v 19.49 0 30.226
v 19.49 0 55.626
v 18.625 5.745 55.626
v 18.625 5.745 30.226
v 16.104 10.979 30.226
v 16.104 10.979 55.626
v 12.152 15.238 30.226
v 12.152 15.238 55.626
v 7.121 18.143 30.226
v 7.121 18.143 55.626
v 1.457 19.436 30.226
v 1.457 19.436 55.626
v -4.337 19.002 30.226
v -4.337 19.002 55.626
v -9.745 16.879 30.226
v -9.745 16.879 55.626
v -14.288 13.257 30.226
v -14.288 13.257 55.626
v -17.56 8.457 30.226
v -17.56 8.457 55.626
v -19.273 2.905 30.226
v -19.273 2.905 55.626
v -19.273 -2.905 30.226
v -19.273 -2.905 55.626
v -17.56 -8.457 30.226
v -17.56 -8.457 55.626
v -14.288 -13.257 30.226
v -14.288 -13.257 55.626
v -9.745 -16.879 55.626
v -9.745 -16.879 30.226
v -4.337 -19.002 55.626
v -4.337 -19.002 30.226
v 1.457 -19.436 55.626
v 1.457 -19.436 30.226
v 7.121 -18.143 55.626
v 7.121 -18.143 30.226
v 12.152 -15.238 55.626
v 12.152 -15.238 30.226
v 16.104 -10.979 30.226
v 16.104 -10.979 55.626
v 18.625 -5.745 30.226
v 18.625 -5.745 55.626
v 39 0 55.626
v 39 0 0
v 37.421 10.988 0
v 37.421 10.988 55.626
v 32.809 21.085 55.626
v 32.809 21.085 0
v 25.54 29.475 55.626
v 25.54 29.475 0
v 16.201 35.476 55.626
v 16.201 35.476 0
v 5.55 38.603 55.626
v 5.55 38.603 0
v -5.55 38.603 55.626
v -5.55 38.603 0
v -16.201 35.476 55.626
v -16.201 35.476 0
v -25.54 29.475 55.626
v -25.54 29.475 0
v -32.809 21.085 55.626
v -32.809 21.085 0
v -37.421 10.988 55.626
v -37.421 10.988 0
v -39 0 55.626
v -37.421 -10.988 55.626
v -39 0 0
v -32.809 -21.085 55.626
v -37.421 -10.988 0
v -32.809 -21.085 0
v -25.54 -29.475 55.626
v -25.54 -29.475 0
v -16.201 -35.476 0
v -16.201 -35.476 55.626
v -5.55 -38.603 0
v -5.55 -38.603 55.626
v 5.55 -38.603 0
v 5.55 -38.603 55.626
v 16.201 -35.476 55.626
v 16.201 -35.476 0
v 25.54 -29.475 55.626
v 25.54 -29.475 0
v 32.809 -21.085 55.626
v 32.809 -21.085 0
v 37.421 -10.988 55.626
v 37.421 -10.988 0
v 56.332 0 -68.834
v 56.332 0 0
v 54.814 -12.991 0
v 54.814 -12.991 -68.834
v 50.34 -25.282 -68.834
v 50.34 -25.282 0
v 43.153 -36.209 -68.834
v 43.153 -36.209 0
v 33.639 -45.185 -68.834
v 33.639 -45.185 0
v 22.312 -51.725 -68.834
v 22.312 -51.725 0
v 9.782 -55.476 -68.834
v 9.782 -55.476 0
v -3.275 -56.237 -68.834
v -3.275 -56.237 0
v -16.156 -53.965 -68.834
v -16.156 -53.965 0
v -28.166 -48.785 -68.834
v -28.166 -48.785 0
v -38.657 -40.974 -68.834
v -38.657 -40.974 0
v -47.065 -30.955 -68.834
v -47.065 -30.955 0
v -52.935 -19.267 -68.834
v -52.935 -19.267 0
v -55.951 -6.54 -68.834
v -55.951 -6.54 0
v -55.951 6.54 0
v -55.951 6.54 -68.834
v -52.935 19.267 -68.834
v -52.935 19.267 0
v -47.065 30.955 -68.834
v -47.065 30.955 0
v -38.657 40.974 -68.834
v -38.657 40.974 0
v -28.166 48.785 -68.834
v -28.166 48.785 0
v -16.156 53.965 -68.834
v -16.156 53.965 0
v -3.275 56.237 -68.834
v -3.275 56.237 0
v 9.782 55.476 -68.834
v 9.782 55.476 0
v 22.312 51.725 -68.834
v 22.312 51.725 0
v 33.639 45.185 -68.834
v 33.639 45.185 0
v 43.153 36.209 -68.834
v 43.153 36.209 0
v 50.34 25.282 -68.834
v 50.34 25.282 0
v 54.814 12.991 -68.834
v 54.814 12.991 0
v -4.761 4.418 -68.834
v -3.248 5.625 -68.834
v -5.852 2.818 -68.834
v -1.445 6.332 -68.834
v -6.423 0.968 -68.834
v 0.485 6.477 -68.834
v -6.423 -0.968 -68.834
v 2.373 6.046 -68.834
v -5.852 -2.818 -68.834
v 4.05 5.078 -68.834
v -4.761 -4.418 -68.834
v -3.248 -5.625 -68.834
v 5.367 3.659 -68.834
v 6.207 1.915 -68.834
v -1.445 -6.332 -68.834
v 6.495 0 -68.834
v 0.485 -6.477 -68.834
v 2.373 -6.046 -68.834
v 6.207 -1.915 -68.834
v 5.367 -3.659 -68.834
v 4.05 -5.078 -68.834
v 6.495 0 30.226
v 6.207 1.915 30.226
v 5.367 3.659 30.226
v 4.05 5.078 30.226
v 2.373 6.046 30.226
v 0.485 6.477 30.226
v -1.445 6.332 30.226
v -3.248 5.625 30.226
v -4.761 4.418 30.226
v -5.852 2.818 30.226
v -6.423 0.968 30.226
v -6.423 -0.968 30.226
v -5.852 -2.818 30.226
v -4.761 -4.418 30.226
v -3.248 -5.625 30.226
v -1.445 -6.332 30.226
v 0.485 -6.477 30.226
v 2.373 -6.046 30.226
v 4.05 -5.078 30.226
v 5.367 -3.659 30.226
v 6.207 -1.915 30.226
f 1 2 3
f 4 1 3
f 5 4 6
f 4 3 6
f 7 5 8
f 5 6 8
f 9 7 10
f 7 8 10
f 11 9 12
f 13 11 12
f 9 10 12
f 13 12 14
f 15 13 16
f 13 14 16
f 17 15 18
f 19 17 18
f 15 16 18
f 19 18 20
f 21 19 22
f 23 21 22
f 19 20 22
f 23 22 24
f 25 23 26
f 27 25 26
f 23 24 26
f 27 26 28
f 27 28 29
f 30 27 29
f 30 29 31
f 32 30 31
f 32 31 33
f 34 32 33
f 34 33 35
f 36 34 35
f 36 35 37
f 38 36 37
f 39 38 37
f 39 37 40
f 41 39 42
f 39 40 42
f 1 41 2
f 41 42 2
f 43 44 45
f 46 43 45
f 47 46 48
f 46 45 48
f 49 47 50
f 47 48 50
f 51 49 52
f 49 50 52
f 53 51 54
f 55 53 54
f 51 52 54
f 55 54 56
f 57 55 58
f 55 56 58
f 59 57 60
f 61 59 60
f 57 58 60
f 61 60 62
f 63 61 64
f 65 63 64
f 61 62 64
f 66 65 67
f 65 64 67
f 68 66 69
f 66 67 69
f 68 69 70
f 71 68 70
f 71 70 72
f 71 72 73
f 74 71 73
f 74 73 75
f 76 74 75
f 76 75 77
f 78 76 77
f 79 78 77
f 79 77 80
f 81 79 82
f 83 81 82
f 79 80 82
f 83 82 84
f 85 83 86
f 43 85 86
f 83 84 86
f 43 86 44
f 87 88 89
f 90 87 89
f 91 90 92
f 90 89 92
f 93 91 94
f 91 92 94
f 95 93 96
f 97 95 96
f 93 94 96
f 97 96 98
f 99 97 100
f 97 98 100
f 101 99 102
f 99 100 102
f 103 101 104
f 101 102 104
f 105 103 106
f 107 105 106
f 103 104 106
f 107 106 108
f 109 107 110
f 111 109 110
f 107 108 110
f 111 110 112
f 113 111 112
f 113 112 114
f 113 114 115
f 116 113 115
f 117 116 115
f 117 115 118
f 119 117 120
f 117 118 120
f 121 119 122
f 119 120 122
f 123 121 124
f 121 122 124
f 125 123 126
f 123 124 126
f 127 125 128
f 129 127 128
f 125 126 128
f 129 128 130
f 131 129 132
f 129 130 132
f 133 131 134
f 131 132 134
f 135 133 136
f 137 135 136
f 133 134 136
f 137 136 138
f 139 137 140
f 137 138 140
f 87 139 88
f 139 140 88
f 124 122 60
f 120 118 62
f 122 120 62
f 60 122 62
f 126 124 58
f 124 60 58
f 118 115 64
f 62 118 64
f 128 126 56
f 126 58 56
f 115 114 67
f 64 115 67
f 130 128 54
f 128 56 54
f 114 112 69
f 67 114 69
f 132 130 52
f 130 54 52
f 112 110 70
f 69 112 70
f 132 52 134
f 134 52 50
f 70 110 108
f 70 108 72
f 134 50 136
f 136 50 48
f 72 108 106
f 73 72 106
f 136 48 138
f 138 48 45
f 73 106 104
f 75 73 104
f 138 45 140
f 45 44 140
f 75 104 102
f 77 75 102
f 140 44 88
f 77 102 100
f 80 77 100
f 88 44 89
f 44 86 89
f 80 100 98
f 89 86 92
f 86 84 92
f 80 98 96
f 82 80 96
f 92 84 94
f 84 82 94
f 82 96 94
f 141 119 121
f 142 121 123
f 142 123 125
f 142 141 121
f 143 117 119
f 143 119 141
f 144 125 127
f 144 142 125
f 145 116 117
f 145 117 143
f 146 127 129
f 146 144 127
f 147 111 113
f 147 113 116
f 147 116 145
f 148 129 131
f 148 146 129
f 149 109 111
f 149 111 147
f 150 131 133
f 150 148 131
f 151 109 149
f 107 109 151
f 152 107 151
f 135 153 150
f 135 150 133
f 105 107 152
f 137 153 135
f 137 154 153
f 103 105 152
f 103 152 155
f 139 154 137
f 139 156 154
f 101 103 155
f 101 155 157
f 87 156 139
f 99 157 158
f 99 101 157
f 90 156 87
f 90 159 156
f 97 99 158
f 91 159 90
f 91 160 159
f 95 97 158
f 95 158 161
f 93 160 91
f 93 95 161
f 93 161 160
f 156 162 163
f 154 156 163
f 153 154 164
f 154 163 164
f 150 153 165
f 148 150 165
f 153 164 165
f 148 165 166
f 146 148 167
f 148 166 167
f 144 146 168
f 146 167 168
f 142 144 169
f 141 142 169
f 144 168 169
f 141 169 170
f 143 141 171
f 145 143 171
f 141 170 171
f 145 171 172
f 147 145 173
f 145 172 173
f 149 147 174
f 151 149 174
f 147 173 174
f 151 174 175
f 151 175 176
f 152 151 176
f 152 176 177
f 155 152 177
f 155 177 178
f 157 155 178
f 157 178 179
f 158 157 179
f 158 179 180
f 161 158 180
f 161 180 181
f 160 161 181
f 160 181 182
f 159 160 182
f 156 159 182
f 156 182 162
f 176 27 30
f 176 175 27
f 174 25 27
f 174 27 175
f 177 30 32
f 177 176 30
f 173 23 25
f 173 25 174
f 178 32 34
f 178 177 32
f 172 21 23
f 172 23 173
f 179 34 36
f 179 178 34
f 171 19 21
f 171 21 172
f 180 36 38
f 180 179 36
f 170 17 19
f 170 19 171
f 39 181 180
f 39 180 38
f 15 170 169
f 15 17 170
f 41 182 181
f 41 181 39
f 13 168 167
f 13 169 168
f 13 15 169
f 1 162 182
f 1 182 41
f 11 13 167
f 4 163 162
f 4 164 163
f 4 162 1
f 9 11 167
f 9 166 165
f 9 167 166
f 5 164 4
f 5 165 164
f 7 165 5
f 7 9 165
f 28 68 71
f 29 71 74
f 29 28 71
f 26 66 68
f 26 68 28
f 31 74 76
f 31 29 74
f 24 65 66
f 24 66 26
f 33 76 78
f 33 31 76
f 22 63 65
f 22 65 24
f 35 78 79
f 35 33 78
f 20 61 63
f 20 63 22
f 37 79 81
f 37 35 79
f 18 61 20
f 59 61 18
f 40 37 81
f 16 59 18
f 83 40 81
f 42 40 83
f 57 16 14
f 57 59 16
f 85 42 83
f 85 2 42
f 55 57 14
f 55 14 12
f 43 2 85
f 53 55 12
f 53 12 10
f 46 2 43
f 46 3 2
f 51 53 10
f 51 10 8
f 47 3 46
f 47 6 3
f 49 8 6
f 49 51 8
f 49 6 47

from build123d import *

# Parameters (mm, degrees)
F0_R     = 39.000467
F1_DEPTH = 55.626
F2_R     = 21.469452
F3_DEPTH = 29.464
F4_R     = 19.490474
F5_DEPTH = 25.4
F6_R     = 56.331947
F7_DEPTH = 68.834
F8_R     = 6.495267
F9_DEPTH = 169.164


with BuildPart() as f1:
    # F0 (on Top) → F1 (new body)
    with BuildSketch(Plane.XY):
        Circle(F0_R)
    extrude(amount=F1_DEPTH)

    # F2 (on face) → F3 (join)
    with BuildSketch(Plane.XY.offset(55.626)):
        Circle(F2_R)
    extrude(amount=-F3_DEPTH)

    # F4 (on face) → F5 (cut)
    with BuildSketch(Plane.XY.offset(55.626)):
        Circle(F4_R)
    extrude(amount=-F5_DEPTH, mode=Mode.SUBTRACT)

    # F6 (on face) → F7 (join)
    with BuildSketch(Plane(origin=(0, 0, 0), x_dir=(1, 0, 0), z_dir=(0, 0, -1))):
        Circle(F6_R)
    extrude(amount=F7_DEPTH)

    # F8 (on face) → F9 (cut)
    with BuildSketch(Plane.XY.offset(30.226)):
        Circle(F8_R)
    extrude(amount=-F9_DEPTH, mode=Mode.SUBTRACT)


solid = f1.part
